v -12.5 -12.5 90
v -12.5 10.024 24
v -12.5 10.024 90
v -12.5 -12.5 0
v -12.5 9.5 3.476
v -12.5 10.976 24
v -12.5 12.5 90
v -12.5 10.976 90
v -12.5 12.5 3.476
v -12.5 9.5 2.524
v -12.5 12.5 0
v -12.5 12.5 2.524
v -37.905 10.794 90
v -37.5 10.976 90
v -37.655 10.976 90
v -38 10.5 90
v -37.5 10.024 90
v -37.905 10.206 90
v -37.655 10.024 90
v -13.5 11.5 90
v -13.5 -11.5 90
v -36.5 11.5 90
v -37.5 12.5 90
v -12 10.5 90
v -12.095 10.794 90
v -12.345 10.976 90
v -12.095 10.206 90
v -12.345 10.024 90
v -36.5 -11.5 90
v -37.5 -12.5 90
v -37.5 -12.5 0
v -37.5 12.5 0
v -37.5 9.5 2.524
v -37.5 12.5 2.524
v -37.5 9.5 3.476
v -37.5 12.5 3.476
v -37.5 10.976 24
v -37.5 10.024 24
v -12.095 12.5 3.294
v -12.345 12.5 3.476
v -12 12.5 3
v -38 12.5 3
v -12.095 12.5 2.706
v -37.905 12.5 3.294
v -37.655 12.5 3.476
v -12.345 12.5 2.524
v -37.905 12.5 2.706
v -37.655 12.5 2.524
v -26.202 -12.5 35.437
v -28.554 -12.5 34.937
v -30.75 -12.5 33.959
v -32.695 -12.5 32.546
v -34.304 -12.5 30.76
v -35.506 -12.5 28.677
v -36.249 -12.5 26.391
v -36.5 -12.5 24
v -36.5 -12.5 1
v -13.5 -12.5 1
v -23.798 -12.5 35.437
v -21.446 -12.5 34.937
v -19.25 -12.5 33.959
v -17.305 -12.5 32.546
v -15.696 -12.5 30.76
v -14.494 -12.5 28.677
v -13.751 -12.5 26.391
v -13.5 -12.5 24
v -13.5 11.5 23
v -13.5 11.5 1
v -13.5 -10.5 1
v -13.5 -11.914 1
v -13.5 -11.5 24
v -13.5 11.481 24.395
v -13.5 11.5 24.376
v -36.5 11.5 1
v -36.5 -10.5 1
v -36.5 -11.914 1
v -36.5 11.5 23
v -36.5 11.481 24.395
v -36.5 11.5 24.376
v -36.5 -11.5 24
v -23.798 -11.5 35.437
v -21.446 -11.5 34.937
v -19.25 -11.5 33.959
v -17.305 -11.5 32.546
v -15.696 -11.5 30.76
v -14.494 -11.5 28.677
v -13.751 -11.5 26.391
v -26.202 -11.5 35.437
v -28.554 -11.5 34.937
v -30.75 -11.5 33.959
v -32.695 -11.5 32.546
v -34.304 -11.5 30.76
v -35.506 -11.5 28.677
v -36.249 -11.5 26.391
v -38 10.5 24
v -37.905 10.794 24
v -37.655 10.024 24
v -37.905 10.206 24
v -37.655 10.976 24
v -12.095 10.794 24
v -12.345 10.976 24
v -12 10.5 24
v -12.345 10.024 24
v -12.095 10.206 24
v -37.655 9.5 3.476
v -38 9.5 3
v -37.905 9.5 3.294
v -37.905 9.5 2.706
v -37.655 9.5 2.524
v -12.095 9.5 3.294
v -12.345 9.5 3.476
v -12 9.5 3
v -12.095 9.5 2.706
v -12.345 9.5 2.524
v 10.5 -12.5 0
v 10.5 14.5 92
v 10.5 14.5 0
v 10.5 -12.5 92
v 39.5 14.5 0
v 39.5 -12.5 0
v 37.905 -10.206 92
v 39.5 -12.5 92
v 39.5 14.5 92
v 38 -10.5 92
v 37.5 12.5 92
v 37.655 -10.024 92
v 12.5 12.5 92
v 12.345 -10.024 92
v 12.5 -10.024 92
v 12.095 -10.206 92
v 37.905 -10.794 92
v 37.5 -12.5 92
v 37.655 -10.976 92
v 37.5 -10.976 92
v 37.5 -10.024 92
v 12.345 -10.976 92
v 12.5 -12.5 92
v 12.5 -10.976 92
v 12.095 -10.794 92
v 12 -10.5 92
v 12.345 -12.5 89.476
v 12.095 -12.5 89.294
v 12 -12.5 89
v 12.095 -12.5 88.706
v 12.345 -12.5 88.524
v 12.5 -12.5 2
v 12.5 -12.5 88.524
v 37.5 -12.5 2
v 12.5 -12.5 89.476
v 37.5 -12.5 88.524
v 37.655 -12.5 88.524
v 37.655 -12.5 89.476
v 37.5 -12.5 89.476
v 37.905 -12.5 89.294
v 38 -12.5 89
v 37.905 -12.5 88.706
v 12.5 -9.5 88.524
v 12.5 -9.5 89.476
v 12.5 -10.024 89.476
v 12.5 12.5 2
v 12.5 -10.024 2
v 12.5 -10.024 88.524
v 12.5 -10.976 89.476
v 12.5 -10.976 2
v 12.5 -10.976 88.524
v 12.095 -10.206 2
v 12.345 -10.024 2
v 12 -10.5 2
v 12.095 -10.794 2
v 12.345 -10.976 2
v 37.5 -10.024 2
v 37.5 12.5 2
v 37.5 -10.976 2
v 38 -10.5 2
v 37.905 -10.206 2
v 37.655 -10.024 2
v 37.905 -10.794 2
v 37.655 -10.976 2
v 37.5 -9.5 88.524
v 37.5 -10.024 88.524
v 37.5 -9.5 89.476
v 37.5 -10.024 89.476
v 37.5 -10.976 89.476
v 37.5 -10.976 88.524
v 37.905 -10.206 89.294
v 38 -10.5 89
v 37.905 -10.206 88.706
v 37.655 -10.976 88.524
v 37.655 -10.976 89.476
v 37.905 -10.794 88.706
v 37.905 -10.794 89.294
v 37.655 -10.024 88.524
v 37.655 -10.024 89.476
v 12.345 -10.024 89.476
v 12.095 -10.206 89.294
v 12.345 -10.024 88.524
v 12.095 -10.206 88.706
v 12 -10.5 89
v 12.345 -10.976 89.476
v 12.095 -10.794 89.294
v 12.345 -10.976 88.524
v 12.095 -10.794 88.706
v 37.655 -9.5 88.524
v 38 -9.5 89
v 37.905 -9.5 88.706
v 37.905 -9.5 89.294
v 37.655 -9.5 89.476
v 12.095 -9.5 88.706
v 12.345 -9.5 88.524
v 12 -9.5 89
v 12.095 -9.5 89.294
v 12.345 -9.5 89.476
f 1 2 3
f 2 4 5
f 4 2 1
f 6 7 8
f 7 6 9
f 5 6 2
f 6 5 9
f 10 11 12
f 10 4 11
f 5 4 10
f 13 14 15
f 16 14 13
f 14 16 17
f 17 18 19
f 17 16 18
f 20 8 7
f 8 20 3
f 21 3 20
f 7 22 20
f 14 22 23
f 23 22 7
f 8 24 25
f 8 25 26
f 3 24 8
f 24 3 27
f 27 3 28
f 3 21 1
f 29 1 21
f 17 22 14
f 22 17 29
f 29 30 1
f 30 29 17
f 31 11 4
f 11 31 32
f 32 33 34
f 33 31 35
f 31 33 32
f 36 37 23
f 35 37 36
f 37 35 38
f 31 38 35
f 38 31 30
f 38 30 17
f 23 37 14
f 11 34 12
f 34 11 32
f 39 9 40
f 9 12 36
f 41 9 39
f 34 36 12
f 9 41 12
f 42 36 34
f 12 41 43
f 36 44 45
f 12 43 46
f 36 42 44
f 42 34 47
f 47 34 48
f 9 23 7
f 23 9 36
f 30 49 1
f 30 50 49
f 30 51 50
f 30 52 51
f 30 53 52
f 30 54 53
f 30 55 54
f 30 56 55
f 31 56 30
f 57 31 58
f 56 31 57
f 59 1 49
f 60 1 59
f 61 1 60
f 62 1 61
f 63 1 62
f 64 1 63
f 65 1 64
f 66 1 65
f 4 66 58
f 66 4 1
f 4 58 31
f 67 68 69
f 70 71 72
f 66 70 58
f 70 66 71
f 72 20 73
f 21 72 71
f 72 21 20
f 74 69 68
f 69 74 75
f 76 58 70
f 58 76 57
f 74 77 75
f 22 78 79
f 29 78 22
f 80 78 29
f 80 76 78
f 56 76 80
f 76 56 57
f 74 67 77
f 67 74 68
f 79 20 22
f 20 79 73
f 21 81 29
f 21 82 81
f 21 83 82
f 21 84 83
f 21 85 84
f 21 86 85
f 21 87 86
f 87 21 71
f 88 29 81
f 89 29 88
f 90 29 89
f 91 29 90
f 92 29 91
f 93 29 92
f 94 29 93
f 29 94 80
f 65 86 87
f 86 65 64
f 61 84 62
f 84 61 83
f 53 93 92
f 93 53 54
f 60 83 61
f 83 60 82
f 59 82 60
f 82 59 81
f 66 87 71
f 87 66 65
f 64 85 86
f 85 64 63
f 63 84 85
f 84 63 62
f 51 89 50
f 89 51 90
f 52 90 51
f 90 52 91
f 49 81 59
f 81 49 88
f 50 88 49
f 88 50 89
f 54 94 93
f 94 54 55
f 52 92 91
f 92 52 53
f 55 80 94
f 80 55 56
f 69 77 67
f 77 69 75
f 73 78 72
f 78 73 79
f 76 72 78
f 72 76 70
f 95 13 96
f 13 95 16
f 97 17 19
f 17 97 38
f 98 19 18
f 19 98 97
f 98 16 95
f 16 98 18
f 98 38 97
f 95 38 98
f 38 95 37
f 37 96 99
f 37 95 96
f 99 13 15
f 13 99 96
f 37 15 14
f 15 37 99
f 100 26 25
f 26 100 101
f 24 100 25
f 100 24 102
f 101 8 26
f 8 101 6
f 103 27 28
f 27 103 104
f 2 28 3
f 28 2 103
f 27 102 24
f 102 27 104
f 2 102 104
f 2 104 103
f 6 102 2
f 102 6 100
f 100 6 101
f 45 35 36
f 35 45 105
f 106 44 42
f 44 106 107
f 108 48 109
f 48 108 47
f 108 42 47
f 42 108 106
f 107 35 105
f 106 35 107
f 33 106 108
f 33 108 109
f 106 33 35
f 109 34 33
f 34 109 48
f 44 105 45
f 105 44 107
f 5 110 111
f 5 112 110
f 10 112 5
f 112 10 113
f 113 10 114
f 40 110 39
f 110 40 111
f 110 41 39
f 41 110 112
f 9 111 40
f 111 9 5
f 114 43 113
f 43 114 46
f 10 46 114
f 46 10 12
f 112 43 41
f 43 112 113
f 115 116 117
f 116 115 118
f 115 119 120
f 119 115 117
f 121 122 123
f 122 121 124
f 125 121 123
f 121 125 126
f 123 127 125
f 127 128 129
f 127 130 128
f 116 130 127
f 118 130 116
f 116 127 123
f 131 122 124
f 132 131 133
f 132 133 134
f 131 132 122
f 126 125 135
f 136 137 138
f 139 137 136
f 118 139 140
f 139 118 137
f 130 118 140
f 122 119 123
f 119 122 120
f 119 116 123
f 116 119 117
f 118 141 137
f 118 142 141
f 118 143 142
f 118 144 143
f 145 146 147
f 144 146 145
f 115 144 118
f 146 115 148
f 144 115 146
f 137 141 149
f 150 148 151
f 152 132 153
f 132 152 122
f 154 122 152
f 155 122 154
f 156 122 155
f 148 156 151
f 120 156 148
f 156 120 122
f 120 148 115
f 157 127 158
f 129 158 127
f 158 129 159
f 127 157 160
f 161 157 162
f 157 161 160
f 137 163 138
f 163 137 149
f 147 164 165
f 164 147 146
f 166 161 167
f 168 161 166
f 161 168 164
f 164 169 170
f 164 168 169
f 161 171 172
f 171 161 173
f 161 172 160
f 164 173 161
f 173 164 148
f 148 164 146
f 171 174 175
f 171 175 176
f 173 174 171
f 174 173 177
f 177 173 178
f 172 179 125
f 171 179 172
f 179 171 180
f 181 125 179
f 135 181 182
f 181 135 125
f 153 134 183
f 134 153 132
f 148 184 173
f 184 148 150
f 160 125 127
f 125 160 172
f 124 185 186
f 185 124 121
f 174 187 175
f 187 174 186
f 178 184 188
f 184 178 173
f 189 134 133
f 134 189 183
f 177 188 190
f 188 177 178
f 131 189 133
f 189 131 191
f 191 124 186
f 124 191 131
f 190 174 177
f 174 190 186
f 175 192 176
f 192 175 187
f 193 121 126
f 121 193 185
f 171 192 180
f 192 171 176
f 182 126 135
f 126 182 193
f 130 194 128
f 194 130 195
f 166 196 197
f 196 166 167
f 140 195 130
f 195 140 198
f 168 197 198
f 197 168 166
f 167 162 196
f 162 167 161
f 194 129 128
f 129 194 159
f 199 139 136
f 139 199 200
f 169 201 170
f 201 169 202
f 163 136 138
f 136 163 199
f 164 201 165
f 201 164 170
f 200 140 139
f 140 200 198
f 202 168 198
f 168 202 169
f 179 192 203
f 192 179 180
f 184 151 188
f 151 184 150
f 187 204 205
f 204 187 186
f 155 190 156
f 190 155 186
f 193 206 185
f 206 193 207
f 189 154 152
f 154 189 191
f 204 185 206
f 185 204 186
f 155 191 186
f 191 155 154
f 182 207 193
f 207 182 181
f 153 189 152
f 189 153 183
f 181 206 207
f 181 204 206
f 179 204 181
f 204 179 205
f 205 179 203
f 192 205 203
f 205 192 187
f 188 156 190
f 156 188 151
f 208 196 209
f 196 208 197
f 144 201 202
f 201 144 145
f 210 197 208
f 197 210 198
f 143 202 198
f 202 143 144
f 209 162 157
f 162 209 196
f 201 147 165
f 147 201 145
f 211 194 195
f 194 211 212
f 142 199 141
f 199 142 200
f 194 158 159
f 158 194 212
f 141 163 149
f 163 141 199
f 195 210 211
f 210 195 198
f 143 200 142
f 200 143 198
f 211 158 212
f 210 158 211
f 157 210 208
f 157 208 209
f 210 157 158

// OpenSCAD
// [FL_INDEX: keywords="openscad, 3d_parametric, Pocket_Dice_Tower, csg_solid" | COT="Parametric OpenSCAD design from 3DCodeverse"]
// Title: Pocket Dice Tower

width=25;
depth=25;
height=90;
wall_depth=1;

translate([-width*1.5,-depth/2,0]){
 union(){
  difference(){
   //Build the general tube
   difference() {
    cube([width,depth,height]);
    translate([wall_depth, wall_depth,wall_depth]){
     cube([width-2*wall_depth, depth-2*wall_depth, height]);
    }
   }

   //The opening at the bottom:
   translate([width/2,-1,width-1]){
    rotate([-90,0,0]){
     union() {
      cylinder(h=wall_depth+2, r=width/2-wall_depth);
      translate([-1*(width/2-wall_depth),0,0]){
       cube([width-wall_depth*2, width-wall_depth*2, wall_depth+2]);
      }
     }
    }
   }
  }

  //Output Ramp:
  translate([0,1,0]){
   rotate([45,0,0]){
    color("blue") cube([width, floor(sqrt((depth*depth)*2))-1.5, 1]);
   }
  }

 //Cover rails
  translate([0,width-wall_depth*2,depth-wall_depth]){
   cylinder(h=height-depth+wall_depth, r=wall_depth/2,$fn=10);
  }
  translate([width,width-wall_depth*2,depth-wall_depth]){
   cylinder(h=height-depth+wall_depth, r=wall_depth/2,$fn=10);
  }  

  translate([0,width,wall_depth*3]){
   rotate([90,0,0]){
    cylinder(h=wall_depth*3, r=wall_depth/2, $fn=10);
   }
  }
  translate([width,width,wall_depth*3]){
   rotate([90,0,0]){
    cylinder(h=wall_depth*3, r=wall_depth/2, $fn=10);
   }
  }
 }
}
//cover
translate([width*1.5,-1*wall_depth-depth/2,height+wall_depth*2]){
 color("red")
 rotate([0,180,0])
 difference(){
  translate([-2*wall_depth,wall_depth,0]){
   cube([width+wall_depth*4,depth+wall_depth*2,height+wall_depth*2]);
  }
  translate([0,0,-1]){
   cube([width,depth+wall_depth,height+1]);
  }
 
  //cover Slides
  translate([0,wall_depth*3,0]){
   cylinder(h=height, r=wall_depth/2,$fn=10);
  }
  translate([width,wall_depth*3,0]){
   cylinder(h=height, r=wall_depth/2,$fn=10);
  }

  translate([0,wall_depth*4,wall_depth*3]){
   rotate([90,0,0]){
    cylinder(h=wall_depth*4, r=wall_depth/2, $fn=10);
   }
  }
  translate([width,wall_depth*4,wall_depth*3]){
   rotate([90,0,0]){
    cylinder(h=wall_depth*4, r=wall_depth/2, $fn=10);
   }
  }
 }
}
